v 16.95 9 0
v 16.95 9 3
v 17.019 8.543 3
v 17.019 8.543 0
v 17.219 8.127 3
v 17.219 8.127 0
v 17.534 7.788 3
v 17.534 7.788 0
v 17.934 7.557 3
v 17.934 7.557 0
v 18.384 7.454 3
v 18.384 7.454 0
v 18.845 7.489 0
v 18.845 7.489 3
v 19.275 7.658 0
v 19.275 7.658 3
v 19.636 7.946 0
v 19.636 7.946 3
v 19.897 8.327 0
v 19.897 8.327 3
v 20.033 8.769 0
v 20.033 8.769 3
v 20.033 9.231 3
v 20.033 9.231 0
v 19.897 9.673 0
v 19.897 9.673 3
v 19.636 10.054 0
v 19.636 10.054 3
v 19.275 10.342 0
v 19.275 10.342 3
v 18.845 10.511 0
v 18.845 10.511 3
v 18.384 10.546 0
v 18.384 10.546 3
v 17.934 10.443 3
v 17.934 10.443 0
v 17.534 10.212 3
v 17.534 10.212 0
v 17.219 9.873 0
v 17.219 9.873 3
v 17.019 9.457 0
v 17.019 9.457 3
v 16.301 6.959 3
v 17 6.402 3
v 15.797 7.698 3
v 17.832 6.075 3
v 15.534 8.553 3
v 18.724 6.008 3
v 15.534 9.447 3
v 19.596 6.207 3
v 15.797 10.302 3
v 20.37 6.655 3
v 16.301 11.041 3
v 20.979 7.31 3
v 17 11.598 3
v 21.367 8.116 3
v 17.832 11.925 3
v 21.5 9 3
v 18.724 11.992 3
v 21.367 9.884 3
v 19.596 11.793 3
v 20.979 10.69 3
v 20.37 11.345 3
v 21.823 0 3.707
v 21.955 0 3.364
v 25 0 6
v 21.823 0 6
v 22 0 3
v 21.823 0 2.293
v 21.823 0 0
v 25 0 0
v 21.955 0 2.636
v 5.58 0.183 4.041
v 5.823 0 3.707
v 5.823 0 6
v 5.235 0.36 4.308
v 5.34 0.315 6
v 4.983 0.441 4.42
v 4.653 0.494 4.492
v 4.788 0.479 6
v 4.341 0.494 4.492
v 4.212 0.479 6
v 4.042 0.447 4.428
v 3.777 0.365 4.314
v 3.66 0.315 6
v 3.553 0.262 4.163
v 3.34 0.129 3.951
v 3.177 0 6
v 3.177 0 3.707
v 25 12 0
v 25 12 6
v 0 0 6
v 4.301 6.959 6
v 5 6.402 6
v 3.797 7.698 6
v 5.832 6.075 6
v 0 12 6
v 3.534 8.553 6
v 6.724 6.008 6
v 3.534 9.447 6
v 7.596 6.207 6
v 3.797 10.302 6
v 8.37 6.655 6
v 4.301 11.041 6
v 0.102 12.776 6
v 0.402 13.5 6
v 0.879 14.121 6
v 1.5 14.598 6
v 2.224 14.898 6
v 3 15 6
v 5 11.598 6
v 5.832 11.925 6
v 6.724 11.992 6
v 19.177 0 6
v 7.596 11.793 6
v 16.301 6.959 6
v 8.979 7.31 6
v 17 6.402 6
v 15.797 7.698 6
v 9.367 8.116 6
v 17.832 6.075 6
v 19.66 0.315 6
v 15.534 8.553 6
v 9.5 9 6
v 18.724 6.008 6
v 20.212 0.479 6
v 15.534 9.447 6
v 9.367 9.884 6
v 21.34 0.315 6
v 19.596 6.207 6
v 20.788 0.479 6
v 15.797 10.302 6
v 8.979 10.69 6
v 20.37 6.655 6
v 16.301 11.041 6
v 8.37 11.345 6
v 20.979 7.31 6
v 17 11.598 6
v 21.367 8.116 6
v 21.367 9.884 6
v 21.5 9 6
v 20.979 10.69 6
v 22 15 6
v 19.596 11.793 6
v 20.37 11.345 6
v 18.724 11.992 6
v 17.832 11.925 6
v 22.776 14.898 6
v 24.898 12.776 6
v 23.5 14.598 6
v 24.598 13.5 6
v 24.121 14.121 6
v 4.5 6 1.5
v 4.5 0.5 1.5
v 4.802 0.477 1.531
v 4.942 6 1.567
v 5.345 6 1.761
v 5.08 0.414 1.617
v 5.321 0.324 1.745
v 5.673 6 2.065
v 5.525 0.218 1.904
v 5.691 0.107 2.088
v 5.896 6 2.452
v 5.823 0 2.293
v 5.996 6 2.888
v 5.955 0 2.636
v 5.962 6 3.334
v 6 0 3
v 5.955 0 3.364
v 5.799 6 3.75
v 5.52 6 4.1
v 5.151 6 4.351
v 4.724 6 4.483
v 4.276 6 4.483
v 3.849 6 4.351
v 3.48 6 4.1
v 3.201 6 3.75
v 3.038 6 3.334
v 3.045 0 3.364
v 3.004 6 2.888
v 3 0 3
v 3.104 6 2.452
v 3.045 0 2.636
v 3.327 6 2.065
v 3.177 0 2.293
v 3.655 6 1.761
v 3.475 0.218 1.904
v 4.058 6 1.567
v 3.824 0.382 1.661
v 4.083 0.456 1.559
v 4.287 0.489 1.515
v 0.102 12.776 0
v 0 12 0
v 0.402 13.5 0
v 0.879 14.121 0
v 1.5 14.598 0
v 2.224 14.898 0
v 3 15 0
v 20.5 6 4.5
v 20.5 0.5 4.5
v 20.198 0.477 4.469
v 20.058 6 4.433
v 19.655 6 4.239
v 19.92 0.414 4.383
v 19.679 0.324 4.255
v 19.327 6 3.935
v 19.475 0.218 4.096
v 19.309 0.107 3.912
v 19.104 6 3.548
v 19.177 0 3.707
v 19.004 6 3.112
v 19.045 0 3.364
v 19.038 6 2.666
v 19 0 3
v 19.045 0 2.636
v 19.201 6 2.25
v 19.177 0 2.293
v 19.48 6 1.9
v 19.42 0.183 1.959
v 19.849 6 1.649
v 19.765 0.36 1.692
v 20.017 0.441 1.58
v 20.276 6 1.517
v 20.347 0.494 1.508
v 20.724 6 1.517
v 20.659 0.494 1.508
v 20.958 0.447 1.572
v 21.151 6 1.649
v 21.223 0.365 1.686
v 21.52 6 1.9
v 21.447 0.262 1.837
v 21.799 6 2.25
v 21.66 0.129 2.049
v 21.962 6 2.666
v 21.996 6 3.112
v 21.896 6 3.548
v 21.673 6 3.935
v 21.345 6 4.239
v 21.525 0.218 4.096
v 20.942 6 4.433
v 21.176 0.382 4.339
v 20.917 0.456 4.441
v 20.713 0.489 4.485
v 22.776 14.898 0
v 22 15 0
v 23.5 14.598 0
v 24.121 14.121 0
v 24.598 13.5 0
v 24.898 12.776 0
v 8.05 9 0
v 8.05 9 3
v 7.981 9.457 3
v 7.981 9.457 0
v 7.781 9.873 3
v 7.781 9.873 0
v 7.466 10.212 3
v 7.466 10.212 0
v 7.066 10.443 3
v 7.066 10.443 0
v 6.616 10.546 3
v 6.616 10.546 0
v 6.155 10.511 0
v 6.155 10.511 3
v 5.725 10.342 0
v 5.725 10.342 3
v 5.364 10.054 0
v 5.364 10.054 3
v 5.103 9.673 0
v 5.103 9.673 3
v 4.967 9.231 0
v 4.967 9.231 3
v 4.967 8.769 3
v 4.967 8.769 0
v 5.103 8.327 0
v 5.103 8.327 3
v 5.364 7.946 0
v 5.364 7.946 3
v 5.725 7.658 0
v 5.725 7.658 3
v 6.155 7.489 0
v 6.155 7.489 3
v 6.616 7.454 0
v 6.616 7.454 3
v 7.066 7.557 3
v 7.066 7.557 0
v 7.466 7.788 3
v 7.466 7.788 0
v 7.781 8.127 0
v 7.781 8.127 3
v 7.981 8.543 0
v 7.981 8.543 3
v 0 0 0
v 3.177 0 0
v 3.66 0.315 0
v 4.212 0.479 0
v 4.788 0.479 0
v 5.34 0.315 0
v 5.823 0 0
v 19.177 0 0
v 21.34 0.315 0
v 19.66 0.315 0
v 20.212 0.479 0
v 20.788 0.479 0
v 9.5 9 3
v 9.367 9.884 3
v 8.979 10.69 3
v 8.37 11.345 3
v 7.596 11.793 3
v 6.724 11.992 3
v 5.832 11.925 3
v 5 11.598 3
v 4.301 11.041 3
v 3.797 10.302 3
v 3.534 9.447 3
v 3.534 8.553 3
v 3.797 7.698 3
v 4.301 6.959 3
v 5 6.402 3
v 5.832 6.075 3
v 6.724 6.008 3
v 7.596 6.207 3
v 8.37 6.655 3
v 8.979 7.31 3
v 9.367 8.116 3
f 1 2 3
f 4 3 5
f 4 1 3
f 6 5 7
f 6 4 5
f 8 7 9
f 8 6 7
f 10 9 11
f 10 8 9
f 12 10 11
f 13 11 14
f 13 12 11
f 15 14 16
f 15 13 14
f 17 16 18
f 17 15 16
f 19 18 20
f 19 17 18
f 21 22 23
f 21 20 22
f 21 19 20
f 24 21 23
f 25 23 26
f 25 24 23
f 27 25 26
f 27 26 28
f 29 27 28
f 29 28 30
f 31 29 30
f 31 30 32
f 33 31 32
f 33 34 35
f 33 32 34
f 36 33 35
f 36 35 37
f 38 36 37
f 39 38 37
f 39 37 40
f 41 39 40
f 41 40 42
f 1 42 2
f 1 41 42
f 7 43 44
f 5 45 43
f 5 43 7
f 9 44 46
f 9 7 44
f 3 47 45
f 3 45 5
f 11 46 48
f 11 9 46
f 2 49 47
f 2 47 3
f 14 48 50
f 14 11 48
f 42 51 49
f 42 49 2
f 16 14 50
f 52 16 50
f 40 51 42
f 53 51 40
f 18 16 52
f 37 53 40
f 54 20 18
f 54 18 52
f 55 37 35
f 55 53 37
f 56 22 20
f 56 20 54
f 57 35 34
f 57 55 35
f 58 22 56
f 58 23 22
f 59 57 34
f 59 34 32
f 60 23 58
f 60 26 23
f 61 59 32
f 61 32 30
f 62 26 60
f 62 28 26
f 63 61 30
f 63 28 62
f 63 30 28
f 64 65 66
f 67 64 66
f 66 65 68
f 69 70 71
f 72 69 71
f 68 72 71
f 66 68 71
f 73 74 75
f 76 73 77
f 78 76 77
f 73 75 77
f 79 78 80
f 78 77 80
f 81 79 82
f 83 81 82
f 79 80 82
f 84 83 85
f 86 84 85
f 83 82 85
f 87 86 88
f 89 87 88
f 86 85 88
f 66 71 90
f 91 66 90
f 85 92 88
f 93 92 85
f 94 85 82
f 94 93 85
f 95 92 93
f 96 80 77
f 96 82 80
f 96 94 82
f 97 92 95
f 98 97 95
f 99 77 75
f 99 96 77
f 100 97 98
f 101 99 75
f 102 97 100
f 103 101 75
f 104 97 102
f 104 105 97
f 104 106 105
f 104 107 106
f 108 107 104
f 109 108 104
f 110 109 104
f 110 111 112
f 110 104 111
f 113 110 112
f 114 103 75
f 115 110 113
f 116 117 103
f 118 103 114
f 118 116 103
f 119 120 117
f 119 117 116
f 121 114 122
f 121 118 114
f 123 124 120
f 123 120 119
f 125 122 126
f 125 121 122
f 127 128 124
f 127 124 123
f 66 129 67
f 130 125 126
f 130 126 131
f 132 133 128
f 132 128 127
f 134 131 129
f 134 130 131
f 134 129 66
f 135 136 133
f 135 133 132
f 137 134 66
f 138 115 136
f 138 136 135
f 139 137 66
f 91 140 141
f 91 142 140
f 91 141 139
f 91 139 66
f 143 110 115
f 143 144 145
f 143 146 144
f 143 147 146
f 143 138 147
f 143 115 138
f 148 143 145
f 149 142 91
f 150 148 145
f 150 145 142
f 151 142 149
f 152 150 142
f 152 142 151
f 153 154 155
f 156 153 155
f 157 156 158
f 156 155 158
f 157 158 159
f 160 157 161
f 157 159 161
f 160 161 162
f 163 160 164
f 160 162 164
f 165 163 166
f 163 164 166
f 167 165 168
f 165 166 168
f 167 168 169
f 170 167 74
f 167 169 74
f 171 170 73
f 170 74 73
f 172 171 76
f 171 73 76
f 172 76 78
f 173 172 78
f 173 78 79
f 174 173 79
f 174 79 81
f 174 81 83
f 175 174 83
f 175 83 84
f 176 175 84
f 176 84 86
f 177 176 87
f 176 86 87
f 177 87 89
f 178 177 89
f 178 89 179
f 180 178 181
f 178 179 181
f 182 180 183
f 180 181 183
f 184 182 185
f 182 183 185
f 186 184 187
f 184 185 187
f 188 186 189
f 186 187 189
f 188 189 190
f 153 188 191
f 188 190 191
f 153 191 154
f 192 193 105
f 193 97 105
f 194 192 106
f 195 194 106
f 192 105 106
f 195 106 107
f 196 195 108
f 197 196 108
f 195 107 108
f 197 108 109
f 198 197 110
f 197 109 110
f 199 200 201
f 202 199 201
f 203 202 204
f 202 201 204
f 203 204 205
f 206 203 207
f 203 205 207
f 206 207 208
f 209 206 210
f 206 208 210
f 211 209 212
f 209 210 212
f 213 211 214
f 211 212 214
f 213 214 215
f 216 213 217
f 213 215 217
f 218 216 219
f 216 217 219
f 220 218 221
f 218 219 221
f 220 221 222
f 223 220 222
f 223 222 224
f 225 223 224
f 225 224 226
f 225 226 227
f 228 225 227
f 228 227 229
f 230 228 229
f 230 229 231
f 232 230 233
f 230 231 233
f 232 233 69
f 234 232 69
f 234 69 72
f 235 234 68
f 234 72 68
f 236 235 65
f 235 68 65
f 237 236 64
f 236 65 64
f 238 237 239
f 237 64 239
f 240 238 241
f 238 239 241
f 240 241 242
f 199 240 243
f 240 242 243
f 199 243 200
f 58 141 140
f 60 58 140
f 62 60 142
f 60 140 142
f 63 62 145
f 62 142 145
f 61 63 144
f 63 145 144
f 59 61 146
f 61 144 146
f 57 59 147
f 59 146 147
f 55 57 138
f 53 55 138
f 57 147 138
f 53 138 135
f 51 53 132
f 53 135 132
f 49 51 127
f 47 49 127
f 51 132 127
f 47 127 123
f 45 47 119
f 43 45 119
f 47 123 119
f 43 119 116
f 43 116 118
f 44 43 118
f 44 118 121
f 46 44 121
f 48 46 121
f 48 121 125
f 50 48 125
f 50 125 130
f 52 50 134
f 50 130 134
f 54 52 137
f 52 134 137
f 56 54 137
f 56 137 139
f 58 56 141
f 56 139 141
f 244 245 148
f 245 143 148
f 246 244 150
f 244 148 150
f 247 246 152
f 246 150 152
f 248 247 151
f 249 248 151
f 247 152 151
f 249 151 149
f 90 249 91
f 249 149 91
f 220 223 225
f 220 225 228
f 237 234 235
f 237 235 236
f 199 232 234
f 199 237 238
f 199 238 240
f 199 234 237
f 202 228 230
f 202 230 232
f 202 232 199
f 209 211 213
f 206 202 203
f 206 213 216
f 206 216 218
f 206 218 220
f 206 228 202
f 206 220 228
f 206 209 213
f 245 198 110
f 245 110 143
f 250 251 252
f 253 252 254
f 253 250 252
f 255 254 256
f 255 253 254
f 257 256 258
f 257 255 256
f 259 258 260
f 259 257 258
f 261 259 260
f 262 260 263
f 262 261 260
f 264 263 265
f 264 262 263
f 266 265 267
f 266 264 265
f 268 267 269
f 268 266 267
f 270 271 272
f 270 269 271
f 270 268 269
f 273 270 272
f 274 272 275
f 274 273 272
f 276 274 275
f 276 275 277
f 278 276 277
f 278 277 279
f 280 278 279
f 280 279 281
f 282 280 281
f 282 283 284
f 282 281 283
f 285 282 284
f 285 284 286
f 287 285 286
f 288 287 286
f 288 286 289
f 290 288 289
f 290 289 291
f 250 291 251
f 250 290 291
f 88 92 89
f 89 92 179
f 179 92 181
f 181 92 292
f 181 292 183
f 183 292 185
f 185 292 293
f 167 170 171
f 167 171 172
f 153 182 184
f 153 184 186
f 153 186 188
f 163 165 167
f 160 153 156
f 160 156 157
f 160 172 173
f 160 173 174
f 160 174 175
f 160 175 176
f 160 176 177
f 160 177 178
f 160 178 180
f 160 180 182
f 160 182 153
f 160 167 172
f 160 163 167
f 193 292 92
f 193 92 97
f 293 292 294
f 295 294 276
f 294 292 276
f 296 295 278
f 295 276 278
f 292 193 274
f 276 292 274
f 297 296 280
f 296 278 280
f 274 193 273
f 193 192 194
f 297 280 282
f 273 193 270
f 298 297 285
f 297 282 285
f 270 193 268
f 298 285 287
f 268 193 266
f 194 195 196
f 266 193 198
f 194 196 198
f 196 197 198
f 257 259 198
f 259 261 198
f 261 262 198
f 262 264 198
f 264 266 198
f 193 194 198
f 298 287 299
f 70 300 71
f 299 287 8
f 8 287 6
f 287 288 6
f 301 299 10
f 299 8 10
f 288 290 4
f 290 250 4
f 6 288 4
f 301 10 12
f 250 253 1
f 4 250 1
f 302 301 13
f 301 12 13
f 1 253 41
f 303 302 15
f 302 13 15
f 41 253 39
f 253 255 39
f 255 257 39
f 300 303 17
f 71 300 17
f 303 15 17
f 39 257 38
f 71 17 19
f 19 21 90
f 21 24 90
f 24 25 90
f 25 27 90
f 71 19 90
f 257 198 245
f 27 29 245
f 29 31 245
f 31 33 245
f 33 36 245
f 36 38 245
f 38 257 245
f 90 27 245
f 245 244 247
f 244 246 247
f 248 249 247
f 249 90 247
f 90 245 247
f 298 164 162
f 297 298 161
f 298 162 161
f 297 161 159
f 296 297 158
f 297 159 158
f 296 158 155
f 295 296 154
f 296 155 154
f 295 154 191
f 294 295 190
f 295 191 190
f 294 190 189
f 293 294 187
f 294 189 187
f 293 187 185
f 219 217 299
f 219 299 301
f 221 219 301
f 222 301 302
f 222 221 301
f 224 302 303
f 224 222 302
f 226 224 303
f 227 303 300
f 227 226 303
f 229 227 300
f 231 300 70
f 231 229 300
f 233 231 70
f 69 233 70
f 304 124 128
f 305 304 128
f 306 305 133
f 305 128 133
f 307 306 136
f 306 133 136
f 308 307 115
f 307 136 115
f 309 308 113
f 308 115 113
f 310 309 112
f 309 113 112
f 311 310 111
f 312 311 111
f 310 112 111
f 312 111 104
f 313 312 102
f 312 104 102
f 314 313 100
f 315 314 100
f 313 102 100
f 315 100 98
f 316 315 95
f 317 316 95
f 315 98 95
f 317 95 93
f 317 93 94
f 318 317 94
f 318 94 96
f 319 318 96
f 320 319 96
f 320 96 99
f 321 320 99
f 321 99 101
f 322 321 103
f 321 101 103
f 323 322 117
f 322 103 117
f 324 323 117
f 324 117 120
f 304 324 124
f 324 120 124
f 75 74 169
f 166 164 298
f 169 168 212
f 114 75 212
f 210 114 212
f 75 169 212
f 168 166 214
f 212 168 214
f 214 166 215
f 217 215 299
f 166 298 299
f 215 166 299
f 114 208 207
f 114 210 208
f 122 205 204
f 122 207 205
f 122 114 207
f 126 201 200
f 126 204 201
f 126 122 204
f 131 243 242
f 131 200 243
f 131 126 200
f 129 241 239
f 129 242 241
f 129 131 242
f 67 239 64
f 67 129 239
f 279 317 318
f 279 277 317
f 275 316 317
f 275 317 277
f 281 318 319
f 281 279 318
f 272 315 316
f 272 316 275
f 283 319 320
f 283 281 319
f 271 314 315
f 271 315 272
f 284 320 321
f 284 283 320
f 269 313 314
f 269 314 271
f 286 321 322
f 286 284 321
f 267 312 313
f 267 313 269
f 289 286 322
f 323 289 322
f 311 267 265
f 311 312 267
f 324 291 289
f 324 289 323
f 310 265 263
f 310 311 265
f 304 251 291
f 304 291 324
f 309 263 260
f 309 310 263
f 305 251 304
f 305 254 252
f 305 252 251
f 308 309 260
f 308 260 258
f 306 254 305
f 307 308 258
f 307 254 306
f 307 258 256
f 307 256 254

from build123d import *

# Parameters (mm, degrees)
SKETCH_1_W          = 25
SKETCH_1_H          = 15
SKETCH_1_R          = 1.55
EXTRUDE_1_DEPTH     = 6
SKETCH_3_R          = 1.5
CUT_EXTRUDE_1_DEPTH = 6
CUT_EXTRUDE_2_DEPTH = 30.765752132
FILLET_1_R          = 3
SKETCH_5_R          = 3
CUT_EXTRUDE_3_DEPTH = 3


with BuildPart() as part:
    # ｽｹｯﾁ1 → ﾎﾞｽ - 押し出し1 (new body)
    with BuildSketch(Plane.XY):
        with Locations((12.5, 7.5)):
            Rectangle(SKETCH_1_W, SKETCH_1_H)
        with Locations((6.5, 9)):
            Circle(SKETCH_1_R, mode=Mode.SUBTRACT)
        with Locations(Location((18.5, 9, 0), (0, 0, 180))):
            Circle(SKETCH_1_R, mode=Mode.SUBTRACT)
    extrude(amount=EXTRUDE_1_DEPTH)

    # ｽｹｯﾁ3 → ｶｯﾄ - 押し出し1 (cut)
    with BuildSketch(Plane.XZ):
        with Locations(Location((4.5, 3, 0), (0, 0, 270))):
            Circle(SKETCH_3_R)
        with Locations(Location((20.5, 3, 0), (0, 0, 90))):
            Circle(SKETCH_3_R)
    extrude(amount=-CUT_EXTRUDE_1_DEPTH, mode=Mode.SUBTRACT)

    # ｽｹｯﾁ4 → ｶｯﾄ - 押し出し2 (cut, through all)
    with BuildSketch(Plane.XY.offset(6)):
        with BuildLine():
            Line((3.177124344, 0), (5.822875656, 0))
            ThreePointArc((5.822875656, 0), (4.5, 0.5), (3.177124344, 0))
        make_face()
        with BuildLine():
            Line((21.822875656, 0), (19.177124344, 0))
            ThreePointArc((19.177124344, 0), (20.5, 0.5), (21.822875656, 0))
        make_face()
    extrude(amount=-CUT_EXTRUDE_2_DEPTH, mode=Mode.SUBTRACT)

    # ﾌｨﾚｯﾄ1
    fillet_1_edges = [part.edges().sort_by_distance(p)[0] for p in [
        (0, 15, 3),
        (25, 15, 3),
    ]]
    fillet(fillet_1_edges, radius=FILLET_1_R)

    # ｽｹｯﾁ5 → ｶｯﾄ - 押し出し3 (cut)
    with BuildSketch(Plane.XY.offset(6)):
        with Locations((6.5, 9)):
            Circle(SKETCH_5_R)
        with Locations((18.5, 9)):
            Circle(SKETCH_5_R)
    extrude(amount=-CUT_EXTRUDE_3_DEPTH, mode=Mode.SUBTRACT)


solid = part.part
